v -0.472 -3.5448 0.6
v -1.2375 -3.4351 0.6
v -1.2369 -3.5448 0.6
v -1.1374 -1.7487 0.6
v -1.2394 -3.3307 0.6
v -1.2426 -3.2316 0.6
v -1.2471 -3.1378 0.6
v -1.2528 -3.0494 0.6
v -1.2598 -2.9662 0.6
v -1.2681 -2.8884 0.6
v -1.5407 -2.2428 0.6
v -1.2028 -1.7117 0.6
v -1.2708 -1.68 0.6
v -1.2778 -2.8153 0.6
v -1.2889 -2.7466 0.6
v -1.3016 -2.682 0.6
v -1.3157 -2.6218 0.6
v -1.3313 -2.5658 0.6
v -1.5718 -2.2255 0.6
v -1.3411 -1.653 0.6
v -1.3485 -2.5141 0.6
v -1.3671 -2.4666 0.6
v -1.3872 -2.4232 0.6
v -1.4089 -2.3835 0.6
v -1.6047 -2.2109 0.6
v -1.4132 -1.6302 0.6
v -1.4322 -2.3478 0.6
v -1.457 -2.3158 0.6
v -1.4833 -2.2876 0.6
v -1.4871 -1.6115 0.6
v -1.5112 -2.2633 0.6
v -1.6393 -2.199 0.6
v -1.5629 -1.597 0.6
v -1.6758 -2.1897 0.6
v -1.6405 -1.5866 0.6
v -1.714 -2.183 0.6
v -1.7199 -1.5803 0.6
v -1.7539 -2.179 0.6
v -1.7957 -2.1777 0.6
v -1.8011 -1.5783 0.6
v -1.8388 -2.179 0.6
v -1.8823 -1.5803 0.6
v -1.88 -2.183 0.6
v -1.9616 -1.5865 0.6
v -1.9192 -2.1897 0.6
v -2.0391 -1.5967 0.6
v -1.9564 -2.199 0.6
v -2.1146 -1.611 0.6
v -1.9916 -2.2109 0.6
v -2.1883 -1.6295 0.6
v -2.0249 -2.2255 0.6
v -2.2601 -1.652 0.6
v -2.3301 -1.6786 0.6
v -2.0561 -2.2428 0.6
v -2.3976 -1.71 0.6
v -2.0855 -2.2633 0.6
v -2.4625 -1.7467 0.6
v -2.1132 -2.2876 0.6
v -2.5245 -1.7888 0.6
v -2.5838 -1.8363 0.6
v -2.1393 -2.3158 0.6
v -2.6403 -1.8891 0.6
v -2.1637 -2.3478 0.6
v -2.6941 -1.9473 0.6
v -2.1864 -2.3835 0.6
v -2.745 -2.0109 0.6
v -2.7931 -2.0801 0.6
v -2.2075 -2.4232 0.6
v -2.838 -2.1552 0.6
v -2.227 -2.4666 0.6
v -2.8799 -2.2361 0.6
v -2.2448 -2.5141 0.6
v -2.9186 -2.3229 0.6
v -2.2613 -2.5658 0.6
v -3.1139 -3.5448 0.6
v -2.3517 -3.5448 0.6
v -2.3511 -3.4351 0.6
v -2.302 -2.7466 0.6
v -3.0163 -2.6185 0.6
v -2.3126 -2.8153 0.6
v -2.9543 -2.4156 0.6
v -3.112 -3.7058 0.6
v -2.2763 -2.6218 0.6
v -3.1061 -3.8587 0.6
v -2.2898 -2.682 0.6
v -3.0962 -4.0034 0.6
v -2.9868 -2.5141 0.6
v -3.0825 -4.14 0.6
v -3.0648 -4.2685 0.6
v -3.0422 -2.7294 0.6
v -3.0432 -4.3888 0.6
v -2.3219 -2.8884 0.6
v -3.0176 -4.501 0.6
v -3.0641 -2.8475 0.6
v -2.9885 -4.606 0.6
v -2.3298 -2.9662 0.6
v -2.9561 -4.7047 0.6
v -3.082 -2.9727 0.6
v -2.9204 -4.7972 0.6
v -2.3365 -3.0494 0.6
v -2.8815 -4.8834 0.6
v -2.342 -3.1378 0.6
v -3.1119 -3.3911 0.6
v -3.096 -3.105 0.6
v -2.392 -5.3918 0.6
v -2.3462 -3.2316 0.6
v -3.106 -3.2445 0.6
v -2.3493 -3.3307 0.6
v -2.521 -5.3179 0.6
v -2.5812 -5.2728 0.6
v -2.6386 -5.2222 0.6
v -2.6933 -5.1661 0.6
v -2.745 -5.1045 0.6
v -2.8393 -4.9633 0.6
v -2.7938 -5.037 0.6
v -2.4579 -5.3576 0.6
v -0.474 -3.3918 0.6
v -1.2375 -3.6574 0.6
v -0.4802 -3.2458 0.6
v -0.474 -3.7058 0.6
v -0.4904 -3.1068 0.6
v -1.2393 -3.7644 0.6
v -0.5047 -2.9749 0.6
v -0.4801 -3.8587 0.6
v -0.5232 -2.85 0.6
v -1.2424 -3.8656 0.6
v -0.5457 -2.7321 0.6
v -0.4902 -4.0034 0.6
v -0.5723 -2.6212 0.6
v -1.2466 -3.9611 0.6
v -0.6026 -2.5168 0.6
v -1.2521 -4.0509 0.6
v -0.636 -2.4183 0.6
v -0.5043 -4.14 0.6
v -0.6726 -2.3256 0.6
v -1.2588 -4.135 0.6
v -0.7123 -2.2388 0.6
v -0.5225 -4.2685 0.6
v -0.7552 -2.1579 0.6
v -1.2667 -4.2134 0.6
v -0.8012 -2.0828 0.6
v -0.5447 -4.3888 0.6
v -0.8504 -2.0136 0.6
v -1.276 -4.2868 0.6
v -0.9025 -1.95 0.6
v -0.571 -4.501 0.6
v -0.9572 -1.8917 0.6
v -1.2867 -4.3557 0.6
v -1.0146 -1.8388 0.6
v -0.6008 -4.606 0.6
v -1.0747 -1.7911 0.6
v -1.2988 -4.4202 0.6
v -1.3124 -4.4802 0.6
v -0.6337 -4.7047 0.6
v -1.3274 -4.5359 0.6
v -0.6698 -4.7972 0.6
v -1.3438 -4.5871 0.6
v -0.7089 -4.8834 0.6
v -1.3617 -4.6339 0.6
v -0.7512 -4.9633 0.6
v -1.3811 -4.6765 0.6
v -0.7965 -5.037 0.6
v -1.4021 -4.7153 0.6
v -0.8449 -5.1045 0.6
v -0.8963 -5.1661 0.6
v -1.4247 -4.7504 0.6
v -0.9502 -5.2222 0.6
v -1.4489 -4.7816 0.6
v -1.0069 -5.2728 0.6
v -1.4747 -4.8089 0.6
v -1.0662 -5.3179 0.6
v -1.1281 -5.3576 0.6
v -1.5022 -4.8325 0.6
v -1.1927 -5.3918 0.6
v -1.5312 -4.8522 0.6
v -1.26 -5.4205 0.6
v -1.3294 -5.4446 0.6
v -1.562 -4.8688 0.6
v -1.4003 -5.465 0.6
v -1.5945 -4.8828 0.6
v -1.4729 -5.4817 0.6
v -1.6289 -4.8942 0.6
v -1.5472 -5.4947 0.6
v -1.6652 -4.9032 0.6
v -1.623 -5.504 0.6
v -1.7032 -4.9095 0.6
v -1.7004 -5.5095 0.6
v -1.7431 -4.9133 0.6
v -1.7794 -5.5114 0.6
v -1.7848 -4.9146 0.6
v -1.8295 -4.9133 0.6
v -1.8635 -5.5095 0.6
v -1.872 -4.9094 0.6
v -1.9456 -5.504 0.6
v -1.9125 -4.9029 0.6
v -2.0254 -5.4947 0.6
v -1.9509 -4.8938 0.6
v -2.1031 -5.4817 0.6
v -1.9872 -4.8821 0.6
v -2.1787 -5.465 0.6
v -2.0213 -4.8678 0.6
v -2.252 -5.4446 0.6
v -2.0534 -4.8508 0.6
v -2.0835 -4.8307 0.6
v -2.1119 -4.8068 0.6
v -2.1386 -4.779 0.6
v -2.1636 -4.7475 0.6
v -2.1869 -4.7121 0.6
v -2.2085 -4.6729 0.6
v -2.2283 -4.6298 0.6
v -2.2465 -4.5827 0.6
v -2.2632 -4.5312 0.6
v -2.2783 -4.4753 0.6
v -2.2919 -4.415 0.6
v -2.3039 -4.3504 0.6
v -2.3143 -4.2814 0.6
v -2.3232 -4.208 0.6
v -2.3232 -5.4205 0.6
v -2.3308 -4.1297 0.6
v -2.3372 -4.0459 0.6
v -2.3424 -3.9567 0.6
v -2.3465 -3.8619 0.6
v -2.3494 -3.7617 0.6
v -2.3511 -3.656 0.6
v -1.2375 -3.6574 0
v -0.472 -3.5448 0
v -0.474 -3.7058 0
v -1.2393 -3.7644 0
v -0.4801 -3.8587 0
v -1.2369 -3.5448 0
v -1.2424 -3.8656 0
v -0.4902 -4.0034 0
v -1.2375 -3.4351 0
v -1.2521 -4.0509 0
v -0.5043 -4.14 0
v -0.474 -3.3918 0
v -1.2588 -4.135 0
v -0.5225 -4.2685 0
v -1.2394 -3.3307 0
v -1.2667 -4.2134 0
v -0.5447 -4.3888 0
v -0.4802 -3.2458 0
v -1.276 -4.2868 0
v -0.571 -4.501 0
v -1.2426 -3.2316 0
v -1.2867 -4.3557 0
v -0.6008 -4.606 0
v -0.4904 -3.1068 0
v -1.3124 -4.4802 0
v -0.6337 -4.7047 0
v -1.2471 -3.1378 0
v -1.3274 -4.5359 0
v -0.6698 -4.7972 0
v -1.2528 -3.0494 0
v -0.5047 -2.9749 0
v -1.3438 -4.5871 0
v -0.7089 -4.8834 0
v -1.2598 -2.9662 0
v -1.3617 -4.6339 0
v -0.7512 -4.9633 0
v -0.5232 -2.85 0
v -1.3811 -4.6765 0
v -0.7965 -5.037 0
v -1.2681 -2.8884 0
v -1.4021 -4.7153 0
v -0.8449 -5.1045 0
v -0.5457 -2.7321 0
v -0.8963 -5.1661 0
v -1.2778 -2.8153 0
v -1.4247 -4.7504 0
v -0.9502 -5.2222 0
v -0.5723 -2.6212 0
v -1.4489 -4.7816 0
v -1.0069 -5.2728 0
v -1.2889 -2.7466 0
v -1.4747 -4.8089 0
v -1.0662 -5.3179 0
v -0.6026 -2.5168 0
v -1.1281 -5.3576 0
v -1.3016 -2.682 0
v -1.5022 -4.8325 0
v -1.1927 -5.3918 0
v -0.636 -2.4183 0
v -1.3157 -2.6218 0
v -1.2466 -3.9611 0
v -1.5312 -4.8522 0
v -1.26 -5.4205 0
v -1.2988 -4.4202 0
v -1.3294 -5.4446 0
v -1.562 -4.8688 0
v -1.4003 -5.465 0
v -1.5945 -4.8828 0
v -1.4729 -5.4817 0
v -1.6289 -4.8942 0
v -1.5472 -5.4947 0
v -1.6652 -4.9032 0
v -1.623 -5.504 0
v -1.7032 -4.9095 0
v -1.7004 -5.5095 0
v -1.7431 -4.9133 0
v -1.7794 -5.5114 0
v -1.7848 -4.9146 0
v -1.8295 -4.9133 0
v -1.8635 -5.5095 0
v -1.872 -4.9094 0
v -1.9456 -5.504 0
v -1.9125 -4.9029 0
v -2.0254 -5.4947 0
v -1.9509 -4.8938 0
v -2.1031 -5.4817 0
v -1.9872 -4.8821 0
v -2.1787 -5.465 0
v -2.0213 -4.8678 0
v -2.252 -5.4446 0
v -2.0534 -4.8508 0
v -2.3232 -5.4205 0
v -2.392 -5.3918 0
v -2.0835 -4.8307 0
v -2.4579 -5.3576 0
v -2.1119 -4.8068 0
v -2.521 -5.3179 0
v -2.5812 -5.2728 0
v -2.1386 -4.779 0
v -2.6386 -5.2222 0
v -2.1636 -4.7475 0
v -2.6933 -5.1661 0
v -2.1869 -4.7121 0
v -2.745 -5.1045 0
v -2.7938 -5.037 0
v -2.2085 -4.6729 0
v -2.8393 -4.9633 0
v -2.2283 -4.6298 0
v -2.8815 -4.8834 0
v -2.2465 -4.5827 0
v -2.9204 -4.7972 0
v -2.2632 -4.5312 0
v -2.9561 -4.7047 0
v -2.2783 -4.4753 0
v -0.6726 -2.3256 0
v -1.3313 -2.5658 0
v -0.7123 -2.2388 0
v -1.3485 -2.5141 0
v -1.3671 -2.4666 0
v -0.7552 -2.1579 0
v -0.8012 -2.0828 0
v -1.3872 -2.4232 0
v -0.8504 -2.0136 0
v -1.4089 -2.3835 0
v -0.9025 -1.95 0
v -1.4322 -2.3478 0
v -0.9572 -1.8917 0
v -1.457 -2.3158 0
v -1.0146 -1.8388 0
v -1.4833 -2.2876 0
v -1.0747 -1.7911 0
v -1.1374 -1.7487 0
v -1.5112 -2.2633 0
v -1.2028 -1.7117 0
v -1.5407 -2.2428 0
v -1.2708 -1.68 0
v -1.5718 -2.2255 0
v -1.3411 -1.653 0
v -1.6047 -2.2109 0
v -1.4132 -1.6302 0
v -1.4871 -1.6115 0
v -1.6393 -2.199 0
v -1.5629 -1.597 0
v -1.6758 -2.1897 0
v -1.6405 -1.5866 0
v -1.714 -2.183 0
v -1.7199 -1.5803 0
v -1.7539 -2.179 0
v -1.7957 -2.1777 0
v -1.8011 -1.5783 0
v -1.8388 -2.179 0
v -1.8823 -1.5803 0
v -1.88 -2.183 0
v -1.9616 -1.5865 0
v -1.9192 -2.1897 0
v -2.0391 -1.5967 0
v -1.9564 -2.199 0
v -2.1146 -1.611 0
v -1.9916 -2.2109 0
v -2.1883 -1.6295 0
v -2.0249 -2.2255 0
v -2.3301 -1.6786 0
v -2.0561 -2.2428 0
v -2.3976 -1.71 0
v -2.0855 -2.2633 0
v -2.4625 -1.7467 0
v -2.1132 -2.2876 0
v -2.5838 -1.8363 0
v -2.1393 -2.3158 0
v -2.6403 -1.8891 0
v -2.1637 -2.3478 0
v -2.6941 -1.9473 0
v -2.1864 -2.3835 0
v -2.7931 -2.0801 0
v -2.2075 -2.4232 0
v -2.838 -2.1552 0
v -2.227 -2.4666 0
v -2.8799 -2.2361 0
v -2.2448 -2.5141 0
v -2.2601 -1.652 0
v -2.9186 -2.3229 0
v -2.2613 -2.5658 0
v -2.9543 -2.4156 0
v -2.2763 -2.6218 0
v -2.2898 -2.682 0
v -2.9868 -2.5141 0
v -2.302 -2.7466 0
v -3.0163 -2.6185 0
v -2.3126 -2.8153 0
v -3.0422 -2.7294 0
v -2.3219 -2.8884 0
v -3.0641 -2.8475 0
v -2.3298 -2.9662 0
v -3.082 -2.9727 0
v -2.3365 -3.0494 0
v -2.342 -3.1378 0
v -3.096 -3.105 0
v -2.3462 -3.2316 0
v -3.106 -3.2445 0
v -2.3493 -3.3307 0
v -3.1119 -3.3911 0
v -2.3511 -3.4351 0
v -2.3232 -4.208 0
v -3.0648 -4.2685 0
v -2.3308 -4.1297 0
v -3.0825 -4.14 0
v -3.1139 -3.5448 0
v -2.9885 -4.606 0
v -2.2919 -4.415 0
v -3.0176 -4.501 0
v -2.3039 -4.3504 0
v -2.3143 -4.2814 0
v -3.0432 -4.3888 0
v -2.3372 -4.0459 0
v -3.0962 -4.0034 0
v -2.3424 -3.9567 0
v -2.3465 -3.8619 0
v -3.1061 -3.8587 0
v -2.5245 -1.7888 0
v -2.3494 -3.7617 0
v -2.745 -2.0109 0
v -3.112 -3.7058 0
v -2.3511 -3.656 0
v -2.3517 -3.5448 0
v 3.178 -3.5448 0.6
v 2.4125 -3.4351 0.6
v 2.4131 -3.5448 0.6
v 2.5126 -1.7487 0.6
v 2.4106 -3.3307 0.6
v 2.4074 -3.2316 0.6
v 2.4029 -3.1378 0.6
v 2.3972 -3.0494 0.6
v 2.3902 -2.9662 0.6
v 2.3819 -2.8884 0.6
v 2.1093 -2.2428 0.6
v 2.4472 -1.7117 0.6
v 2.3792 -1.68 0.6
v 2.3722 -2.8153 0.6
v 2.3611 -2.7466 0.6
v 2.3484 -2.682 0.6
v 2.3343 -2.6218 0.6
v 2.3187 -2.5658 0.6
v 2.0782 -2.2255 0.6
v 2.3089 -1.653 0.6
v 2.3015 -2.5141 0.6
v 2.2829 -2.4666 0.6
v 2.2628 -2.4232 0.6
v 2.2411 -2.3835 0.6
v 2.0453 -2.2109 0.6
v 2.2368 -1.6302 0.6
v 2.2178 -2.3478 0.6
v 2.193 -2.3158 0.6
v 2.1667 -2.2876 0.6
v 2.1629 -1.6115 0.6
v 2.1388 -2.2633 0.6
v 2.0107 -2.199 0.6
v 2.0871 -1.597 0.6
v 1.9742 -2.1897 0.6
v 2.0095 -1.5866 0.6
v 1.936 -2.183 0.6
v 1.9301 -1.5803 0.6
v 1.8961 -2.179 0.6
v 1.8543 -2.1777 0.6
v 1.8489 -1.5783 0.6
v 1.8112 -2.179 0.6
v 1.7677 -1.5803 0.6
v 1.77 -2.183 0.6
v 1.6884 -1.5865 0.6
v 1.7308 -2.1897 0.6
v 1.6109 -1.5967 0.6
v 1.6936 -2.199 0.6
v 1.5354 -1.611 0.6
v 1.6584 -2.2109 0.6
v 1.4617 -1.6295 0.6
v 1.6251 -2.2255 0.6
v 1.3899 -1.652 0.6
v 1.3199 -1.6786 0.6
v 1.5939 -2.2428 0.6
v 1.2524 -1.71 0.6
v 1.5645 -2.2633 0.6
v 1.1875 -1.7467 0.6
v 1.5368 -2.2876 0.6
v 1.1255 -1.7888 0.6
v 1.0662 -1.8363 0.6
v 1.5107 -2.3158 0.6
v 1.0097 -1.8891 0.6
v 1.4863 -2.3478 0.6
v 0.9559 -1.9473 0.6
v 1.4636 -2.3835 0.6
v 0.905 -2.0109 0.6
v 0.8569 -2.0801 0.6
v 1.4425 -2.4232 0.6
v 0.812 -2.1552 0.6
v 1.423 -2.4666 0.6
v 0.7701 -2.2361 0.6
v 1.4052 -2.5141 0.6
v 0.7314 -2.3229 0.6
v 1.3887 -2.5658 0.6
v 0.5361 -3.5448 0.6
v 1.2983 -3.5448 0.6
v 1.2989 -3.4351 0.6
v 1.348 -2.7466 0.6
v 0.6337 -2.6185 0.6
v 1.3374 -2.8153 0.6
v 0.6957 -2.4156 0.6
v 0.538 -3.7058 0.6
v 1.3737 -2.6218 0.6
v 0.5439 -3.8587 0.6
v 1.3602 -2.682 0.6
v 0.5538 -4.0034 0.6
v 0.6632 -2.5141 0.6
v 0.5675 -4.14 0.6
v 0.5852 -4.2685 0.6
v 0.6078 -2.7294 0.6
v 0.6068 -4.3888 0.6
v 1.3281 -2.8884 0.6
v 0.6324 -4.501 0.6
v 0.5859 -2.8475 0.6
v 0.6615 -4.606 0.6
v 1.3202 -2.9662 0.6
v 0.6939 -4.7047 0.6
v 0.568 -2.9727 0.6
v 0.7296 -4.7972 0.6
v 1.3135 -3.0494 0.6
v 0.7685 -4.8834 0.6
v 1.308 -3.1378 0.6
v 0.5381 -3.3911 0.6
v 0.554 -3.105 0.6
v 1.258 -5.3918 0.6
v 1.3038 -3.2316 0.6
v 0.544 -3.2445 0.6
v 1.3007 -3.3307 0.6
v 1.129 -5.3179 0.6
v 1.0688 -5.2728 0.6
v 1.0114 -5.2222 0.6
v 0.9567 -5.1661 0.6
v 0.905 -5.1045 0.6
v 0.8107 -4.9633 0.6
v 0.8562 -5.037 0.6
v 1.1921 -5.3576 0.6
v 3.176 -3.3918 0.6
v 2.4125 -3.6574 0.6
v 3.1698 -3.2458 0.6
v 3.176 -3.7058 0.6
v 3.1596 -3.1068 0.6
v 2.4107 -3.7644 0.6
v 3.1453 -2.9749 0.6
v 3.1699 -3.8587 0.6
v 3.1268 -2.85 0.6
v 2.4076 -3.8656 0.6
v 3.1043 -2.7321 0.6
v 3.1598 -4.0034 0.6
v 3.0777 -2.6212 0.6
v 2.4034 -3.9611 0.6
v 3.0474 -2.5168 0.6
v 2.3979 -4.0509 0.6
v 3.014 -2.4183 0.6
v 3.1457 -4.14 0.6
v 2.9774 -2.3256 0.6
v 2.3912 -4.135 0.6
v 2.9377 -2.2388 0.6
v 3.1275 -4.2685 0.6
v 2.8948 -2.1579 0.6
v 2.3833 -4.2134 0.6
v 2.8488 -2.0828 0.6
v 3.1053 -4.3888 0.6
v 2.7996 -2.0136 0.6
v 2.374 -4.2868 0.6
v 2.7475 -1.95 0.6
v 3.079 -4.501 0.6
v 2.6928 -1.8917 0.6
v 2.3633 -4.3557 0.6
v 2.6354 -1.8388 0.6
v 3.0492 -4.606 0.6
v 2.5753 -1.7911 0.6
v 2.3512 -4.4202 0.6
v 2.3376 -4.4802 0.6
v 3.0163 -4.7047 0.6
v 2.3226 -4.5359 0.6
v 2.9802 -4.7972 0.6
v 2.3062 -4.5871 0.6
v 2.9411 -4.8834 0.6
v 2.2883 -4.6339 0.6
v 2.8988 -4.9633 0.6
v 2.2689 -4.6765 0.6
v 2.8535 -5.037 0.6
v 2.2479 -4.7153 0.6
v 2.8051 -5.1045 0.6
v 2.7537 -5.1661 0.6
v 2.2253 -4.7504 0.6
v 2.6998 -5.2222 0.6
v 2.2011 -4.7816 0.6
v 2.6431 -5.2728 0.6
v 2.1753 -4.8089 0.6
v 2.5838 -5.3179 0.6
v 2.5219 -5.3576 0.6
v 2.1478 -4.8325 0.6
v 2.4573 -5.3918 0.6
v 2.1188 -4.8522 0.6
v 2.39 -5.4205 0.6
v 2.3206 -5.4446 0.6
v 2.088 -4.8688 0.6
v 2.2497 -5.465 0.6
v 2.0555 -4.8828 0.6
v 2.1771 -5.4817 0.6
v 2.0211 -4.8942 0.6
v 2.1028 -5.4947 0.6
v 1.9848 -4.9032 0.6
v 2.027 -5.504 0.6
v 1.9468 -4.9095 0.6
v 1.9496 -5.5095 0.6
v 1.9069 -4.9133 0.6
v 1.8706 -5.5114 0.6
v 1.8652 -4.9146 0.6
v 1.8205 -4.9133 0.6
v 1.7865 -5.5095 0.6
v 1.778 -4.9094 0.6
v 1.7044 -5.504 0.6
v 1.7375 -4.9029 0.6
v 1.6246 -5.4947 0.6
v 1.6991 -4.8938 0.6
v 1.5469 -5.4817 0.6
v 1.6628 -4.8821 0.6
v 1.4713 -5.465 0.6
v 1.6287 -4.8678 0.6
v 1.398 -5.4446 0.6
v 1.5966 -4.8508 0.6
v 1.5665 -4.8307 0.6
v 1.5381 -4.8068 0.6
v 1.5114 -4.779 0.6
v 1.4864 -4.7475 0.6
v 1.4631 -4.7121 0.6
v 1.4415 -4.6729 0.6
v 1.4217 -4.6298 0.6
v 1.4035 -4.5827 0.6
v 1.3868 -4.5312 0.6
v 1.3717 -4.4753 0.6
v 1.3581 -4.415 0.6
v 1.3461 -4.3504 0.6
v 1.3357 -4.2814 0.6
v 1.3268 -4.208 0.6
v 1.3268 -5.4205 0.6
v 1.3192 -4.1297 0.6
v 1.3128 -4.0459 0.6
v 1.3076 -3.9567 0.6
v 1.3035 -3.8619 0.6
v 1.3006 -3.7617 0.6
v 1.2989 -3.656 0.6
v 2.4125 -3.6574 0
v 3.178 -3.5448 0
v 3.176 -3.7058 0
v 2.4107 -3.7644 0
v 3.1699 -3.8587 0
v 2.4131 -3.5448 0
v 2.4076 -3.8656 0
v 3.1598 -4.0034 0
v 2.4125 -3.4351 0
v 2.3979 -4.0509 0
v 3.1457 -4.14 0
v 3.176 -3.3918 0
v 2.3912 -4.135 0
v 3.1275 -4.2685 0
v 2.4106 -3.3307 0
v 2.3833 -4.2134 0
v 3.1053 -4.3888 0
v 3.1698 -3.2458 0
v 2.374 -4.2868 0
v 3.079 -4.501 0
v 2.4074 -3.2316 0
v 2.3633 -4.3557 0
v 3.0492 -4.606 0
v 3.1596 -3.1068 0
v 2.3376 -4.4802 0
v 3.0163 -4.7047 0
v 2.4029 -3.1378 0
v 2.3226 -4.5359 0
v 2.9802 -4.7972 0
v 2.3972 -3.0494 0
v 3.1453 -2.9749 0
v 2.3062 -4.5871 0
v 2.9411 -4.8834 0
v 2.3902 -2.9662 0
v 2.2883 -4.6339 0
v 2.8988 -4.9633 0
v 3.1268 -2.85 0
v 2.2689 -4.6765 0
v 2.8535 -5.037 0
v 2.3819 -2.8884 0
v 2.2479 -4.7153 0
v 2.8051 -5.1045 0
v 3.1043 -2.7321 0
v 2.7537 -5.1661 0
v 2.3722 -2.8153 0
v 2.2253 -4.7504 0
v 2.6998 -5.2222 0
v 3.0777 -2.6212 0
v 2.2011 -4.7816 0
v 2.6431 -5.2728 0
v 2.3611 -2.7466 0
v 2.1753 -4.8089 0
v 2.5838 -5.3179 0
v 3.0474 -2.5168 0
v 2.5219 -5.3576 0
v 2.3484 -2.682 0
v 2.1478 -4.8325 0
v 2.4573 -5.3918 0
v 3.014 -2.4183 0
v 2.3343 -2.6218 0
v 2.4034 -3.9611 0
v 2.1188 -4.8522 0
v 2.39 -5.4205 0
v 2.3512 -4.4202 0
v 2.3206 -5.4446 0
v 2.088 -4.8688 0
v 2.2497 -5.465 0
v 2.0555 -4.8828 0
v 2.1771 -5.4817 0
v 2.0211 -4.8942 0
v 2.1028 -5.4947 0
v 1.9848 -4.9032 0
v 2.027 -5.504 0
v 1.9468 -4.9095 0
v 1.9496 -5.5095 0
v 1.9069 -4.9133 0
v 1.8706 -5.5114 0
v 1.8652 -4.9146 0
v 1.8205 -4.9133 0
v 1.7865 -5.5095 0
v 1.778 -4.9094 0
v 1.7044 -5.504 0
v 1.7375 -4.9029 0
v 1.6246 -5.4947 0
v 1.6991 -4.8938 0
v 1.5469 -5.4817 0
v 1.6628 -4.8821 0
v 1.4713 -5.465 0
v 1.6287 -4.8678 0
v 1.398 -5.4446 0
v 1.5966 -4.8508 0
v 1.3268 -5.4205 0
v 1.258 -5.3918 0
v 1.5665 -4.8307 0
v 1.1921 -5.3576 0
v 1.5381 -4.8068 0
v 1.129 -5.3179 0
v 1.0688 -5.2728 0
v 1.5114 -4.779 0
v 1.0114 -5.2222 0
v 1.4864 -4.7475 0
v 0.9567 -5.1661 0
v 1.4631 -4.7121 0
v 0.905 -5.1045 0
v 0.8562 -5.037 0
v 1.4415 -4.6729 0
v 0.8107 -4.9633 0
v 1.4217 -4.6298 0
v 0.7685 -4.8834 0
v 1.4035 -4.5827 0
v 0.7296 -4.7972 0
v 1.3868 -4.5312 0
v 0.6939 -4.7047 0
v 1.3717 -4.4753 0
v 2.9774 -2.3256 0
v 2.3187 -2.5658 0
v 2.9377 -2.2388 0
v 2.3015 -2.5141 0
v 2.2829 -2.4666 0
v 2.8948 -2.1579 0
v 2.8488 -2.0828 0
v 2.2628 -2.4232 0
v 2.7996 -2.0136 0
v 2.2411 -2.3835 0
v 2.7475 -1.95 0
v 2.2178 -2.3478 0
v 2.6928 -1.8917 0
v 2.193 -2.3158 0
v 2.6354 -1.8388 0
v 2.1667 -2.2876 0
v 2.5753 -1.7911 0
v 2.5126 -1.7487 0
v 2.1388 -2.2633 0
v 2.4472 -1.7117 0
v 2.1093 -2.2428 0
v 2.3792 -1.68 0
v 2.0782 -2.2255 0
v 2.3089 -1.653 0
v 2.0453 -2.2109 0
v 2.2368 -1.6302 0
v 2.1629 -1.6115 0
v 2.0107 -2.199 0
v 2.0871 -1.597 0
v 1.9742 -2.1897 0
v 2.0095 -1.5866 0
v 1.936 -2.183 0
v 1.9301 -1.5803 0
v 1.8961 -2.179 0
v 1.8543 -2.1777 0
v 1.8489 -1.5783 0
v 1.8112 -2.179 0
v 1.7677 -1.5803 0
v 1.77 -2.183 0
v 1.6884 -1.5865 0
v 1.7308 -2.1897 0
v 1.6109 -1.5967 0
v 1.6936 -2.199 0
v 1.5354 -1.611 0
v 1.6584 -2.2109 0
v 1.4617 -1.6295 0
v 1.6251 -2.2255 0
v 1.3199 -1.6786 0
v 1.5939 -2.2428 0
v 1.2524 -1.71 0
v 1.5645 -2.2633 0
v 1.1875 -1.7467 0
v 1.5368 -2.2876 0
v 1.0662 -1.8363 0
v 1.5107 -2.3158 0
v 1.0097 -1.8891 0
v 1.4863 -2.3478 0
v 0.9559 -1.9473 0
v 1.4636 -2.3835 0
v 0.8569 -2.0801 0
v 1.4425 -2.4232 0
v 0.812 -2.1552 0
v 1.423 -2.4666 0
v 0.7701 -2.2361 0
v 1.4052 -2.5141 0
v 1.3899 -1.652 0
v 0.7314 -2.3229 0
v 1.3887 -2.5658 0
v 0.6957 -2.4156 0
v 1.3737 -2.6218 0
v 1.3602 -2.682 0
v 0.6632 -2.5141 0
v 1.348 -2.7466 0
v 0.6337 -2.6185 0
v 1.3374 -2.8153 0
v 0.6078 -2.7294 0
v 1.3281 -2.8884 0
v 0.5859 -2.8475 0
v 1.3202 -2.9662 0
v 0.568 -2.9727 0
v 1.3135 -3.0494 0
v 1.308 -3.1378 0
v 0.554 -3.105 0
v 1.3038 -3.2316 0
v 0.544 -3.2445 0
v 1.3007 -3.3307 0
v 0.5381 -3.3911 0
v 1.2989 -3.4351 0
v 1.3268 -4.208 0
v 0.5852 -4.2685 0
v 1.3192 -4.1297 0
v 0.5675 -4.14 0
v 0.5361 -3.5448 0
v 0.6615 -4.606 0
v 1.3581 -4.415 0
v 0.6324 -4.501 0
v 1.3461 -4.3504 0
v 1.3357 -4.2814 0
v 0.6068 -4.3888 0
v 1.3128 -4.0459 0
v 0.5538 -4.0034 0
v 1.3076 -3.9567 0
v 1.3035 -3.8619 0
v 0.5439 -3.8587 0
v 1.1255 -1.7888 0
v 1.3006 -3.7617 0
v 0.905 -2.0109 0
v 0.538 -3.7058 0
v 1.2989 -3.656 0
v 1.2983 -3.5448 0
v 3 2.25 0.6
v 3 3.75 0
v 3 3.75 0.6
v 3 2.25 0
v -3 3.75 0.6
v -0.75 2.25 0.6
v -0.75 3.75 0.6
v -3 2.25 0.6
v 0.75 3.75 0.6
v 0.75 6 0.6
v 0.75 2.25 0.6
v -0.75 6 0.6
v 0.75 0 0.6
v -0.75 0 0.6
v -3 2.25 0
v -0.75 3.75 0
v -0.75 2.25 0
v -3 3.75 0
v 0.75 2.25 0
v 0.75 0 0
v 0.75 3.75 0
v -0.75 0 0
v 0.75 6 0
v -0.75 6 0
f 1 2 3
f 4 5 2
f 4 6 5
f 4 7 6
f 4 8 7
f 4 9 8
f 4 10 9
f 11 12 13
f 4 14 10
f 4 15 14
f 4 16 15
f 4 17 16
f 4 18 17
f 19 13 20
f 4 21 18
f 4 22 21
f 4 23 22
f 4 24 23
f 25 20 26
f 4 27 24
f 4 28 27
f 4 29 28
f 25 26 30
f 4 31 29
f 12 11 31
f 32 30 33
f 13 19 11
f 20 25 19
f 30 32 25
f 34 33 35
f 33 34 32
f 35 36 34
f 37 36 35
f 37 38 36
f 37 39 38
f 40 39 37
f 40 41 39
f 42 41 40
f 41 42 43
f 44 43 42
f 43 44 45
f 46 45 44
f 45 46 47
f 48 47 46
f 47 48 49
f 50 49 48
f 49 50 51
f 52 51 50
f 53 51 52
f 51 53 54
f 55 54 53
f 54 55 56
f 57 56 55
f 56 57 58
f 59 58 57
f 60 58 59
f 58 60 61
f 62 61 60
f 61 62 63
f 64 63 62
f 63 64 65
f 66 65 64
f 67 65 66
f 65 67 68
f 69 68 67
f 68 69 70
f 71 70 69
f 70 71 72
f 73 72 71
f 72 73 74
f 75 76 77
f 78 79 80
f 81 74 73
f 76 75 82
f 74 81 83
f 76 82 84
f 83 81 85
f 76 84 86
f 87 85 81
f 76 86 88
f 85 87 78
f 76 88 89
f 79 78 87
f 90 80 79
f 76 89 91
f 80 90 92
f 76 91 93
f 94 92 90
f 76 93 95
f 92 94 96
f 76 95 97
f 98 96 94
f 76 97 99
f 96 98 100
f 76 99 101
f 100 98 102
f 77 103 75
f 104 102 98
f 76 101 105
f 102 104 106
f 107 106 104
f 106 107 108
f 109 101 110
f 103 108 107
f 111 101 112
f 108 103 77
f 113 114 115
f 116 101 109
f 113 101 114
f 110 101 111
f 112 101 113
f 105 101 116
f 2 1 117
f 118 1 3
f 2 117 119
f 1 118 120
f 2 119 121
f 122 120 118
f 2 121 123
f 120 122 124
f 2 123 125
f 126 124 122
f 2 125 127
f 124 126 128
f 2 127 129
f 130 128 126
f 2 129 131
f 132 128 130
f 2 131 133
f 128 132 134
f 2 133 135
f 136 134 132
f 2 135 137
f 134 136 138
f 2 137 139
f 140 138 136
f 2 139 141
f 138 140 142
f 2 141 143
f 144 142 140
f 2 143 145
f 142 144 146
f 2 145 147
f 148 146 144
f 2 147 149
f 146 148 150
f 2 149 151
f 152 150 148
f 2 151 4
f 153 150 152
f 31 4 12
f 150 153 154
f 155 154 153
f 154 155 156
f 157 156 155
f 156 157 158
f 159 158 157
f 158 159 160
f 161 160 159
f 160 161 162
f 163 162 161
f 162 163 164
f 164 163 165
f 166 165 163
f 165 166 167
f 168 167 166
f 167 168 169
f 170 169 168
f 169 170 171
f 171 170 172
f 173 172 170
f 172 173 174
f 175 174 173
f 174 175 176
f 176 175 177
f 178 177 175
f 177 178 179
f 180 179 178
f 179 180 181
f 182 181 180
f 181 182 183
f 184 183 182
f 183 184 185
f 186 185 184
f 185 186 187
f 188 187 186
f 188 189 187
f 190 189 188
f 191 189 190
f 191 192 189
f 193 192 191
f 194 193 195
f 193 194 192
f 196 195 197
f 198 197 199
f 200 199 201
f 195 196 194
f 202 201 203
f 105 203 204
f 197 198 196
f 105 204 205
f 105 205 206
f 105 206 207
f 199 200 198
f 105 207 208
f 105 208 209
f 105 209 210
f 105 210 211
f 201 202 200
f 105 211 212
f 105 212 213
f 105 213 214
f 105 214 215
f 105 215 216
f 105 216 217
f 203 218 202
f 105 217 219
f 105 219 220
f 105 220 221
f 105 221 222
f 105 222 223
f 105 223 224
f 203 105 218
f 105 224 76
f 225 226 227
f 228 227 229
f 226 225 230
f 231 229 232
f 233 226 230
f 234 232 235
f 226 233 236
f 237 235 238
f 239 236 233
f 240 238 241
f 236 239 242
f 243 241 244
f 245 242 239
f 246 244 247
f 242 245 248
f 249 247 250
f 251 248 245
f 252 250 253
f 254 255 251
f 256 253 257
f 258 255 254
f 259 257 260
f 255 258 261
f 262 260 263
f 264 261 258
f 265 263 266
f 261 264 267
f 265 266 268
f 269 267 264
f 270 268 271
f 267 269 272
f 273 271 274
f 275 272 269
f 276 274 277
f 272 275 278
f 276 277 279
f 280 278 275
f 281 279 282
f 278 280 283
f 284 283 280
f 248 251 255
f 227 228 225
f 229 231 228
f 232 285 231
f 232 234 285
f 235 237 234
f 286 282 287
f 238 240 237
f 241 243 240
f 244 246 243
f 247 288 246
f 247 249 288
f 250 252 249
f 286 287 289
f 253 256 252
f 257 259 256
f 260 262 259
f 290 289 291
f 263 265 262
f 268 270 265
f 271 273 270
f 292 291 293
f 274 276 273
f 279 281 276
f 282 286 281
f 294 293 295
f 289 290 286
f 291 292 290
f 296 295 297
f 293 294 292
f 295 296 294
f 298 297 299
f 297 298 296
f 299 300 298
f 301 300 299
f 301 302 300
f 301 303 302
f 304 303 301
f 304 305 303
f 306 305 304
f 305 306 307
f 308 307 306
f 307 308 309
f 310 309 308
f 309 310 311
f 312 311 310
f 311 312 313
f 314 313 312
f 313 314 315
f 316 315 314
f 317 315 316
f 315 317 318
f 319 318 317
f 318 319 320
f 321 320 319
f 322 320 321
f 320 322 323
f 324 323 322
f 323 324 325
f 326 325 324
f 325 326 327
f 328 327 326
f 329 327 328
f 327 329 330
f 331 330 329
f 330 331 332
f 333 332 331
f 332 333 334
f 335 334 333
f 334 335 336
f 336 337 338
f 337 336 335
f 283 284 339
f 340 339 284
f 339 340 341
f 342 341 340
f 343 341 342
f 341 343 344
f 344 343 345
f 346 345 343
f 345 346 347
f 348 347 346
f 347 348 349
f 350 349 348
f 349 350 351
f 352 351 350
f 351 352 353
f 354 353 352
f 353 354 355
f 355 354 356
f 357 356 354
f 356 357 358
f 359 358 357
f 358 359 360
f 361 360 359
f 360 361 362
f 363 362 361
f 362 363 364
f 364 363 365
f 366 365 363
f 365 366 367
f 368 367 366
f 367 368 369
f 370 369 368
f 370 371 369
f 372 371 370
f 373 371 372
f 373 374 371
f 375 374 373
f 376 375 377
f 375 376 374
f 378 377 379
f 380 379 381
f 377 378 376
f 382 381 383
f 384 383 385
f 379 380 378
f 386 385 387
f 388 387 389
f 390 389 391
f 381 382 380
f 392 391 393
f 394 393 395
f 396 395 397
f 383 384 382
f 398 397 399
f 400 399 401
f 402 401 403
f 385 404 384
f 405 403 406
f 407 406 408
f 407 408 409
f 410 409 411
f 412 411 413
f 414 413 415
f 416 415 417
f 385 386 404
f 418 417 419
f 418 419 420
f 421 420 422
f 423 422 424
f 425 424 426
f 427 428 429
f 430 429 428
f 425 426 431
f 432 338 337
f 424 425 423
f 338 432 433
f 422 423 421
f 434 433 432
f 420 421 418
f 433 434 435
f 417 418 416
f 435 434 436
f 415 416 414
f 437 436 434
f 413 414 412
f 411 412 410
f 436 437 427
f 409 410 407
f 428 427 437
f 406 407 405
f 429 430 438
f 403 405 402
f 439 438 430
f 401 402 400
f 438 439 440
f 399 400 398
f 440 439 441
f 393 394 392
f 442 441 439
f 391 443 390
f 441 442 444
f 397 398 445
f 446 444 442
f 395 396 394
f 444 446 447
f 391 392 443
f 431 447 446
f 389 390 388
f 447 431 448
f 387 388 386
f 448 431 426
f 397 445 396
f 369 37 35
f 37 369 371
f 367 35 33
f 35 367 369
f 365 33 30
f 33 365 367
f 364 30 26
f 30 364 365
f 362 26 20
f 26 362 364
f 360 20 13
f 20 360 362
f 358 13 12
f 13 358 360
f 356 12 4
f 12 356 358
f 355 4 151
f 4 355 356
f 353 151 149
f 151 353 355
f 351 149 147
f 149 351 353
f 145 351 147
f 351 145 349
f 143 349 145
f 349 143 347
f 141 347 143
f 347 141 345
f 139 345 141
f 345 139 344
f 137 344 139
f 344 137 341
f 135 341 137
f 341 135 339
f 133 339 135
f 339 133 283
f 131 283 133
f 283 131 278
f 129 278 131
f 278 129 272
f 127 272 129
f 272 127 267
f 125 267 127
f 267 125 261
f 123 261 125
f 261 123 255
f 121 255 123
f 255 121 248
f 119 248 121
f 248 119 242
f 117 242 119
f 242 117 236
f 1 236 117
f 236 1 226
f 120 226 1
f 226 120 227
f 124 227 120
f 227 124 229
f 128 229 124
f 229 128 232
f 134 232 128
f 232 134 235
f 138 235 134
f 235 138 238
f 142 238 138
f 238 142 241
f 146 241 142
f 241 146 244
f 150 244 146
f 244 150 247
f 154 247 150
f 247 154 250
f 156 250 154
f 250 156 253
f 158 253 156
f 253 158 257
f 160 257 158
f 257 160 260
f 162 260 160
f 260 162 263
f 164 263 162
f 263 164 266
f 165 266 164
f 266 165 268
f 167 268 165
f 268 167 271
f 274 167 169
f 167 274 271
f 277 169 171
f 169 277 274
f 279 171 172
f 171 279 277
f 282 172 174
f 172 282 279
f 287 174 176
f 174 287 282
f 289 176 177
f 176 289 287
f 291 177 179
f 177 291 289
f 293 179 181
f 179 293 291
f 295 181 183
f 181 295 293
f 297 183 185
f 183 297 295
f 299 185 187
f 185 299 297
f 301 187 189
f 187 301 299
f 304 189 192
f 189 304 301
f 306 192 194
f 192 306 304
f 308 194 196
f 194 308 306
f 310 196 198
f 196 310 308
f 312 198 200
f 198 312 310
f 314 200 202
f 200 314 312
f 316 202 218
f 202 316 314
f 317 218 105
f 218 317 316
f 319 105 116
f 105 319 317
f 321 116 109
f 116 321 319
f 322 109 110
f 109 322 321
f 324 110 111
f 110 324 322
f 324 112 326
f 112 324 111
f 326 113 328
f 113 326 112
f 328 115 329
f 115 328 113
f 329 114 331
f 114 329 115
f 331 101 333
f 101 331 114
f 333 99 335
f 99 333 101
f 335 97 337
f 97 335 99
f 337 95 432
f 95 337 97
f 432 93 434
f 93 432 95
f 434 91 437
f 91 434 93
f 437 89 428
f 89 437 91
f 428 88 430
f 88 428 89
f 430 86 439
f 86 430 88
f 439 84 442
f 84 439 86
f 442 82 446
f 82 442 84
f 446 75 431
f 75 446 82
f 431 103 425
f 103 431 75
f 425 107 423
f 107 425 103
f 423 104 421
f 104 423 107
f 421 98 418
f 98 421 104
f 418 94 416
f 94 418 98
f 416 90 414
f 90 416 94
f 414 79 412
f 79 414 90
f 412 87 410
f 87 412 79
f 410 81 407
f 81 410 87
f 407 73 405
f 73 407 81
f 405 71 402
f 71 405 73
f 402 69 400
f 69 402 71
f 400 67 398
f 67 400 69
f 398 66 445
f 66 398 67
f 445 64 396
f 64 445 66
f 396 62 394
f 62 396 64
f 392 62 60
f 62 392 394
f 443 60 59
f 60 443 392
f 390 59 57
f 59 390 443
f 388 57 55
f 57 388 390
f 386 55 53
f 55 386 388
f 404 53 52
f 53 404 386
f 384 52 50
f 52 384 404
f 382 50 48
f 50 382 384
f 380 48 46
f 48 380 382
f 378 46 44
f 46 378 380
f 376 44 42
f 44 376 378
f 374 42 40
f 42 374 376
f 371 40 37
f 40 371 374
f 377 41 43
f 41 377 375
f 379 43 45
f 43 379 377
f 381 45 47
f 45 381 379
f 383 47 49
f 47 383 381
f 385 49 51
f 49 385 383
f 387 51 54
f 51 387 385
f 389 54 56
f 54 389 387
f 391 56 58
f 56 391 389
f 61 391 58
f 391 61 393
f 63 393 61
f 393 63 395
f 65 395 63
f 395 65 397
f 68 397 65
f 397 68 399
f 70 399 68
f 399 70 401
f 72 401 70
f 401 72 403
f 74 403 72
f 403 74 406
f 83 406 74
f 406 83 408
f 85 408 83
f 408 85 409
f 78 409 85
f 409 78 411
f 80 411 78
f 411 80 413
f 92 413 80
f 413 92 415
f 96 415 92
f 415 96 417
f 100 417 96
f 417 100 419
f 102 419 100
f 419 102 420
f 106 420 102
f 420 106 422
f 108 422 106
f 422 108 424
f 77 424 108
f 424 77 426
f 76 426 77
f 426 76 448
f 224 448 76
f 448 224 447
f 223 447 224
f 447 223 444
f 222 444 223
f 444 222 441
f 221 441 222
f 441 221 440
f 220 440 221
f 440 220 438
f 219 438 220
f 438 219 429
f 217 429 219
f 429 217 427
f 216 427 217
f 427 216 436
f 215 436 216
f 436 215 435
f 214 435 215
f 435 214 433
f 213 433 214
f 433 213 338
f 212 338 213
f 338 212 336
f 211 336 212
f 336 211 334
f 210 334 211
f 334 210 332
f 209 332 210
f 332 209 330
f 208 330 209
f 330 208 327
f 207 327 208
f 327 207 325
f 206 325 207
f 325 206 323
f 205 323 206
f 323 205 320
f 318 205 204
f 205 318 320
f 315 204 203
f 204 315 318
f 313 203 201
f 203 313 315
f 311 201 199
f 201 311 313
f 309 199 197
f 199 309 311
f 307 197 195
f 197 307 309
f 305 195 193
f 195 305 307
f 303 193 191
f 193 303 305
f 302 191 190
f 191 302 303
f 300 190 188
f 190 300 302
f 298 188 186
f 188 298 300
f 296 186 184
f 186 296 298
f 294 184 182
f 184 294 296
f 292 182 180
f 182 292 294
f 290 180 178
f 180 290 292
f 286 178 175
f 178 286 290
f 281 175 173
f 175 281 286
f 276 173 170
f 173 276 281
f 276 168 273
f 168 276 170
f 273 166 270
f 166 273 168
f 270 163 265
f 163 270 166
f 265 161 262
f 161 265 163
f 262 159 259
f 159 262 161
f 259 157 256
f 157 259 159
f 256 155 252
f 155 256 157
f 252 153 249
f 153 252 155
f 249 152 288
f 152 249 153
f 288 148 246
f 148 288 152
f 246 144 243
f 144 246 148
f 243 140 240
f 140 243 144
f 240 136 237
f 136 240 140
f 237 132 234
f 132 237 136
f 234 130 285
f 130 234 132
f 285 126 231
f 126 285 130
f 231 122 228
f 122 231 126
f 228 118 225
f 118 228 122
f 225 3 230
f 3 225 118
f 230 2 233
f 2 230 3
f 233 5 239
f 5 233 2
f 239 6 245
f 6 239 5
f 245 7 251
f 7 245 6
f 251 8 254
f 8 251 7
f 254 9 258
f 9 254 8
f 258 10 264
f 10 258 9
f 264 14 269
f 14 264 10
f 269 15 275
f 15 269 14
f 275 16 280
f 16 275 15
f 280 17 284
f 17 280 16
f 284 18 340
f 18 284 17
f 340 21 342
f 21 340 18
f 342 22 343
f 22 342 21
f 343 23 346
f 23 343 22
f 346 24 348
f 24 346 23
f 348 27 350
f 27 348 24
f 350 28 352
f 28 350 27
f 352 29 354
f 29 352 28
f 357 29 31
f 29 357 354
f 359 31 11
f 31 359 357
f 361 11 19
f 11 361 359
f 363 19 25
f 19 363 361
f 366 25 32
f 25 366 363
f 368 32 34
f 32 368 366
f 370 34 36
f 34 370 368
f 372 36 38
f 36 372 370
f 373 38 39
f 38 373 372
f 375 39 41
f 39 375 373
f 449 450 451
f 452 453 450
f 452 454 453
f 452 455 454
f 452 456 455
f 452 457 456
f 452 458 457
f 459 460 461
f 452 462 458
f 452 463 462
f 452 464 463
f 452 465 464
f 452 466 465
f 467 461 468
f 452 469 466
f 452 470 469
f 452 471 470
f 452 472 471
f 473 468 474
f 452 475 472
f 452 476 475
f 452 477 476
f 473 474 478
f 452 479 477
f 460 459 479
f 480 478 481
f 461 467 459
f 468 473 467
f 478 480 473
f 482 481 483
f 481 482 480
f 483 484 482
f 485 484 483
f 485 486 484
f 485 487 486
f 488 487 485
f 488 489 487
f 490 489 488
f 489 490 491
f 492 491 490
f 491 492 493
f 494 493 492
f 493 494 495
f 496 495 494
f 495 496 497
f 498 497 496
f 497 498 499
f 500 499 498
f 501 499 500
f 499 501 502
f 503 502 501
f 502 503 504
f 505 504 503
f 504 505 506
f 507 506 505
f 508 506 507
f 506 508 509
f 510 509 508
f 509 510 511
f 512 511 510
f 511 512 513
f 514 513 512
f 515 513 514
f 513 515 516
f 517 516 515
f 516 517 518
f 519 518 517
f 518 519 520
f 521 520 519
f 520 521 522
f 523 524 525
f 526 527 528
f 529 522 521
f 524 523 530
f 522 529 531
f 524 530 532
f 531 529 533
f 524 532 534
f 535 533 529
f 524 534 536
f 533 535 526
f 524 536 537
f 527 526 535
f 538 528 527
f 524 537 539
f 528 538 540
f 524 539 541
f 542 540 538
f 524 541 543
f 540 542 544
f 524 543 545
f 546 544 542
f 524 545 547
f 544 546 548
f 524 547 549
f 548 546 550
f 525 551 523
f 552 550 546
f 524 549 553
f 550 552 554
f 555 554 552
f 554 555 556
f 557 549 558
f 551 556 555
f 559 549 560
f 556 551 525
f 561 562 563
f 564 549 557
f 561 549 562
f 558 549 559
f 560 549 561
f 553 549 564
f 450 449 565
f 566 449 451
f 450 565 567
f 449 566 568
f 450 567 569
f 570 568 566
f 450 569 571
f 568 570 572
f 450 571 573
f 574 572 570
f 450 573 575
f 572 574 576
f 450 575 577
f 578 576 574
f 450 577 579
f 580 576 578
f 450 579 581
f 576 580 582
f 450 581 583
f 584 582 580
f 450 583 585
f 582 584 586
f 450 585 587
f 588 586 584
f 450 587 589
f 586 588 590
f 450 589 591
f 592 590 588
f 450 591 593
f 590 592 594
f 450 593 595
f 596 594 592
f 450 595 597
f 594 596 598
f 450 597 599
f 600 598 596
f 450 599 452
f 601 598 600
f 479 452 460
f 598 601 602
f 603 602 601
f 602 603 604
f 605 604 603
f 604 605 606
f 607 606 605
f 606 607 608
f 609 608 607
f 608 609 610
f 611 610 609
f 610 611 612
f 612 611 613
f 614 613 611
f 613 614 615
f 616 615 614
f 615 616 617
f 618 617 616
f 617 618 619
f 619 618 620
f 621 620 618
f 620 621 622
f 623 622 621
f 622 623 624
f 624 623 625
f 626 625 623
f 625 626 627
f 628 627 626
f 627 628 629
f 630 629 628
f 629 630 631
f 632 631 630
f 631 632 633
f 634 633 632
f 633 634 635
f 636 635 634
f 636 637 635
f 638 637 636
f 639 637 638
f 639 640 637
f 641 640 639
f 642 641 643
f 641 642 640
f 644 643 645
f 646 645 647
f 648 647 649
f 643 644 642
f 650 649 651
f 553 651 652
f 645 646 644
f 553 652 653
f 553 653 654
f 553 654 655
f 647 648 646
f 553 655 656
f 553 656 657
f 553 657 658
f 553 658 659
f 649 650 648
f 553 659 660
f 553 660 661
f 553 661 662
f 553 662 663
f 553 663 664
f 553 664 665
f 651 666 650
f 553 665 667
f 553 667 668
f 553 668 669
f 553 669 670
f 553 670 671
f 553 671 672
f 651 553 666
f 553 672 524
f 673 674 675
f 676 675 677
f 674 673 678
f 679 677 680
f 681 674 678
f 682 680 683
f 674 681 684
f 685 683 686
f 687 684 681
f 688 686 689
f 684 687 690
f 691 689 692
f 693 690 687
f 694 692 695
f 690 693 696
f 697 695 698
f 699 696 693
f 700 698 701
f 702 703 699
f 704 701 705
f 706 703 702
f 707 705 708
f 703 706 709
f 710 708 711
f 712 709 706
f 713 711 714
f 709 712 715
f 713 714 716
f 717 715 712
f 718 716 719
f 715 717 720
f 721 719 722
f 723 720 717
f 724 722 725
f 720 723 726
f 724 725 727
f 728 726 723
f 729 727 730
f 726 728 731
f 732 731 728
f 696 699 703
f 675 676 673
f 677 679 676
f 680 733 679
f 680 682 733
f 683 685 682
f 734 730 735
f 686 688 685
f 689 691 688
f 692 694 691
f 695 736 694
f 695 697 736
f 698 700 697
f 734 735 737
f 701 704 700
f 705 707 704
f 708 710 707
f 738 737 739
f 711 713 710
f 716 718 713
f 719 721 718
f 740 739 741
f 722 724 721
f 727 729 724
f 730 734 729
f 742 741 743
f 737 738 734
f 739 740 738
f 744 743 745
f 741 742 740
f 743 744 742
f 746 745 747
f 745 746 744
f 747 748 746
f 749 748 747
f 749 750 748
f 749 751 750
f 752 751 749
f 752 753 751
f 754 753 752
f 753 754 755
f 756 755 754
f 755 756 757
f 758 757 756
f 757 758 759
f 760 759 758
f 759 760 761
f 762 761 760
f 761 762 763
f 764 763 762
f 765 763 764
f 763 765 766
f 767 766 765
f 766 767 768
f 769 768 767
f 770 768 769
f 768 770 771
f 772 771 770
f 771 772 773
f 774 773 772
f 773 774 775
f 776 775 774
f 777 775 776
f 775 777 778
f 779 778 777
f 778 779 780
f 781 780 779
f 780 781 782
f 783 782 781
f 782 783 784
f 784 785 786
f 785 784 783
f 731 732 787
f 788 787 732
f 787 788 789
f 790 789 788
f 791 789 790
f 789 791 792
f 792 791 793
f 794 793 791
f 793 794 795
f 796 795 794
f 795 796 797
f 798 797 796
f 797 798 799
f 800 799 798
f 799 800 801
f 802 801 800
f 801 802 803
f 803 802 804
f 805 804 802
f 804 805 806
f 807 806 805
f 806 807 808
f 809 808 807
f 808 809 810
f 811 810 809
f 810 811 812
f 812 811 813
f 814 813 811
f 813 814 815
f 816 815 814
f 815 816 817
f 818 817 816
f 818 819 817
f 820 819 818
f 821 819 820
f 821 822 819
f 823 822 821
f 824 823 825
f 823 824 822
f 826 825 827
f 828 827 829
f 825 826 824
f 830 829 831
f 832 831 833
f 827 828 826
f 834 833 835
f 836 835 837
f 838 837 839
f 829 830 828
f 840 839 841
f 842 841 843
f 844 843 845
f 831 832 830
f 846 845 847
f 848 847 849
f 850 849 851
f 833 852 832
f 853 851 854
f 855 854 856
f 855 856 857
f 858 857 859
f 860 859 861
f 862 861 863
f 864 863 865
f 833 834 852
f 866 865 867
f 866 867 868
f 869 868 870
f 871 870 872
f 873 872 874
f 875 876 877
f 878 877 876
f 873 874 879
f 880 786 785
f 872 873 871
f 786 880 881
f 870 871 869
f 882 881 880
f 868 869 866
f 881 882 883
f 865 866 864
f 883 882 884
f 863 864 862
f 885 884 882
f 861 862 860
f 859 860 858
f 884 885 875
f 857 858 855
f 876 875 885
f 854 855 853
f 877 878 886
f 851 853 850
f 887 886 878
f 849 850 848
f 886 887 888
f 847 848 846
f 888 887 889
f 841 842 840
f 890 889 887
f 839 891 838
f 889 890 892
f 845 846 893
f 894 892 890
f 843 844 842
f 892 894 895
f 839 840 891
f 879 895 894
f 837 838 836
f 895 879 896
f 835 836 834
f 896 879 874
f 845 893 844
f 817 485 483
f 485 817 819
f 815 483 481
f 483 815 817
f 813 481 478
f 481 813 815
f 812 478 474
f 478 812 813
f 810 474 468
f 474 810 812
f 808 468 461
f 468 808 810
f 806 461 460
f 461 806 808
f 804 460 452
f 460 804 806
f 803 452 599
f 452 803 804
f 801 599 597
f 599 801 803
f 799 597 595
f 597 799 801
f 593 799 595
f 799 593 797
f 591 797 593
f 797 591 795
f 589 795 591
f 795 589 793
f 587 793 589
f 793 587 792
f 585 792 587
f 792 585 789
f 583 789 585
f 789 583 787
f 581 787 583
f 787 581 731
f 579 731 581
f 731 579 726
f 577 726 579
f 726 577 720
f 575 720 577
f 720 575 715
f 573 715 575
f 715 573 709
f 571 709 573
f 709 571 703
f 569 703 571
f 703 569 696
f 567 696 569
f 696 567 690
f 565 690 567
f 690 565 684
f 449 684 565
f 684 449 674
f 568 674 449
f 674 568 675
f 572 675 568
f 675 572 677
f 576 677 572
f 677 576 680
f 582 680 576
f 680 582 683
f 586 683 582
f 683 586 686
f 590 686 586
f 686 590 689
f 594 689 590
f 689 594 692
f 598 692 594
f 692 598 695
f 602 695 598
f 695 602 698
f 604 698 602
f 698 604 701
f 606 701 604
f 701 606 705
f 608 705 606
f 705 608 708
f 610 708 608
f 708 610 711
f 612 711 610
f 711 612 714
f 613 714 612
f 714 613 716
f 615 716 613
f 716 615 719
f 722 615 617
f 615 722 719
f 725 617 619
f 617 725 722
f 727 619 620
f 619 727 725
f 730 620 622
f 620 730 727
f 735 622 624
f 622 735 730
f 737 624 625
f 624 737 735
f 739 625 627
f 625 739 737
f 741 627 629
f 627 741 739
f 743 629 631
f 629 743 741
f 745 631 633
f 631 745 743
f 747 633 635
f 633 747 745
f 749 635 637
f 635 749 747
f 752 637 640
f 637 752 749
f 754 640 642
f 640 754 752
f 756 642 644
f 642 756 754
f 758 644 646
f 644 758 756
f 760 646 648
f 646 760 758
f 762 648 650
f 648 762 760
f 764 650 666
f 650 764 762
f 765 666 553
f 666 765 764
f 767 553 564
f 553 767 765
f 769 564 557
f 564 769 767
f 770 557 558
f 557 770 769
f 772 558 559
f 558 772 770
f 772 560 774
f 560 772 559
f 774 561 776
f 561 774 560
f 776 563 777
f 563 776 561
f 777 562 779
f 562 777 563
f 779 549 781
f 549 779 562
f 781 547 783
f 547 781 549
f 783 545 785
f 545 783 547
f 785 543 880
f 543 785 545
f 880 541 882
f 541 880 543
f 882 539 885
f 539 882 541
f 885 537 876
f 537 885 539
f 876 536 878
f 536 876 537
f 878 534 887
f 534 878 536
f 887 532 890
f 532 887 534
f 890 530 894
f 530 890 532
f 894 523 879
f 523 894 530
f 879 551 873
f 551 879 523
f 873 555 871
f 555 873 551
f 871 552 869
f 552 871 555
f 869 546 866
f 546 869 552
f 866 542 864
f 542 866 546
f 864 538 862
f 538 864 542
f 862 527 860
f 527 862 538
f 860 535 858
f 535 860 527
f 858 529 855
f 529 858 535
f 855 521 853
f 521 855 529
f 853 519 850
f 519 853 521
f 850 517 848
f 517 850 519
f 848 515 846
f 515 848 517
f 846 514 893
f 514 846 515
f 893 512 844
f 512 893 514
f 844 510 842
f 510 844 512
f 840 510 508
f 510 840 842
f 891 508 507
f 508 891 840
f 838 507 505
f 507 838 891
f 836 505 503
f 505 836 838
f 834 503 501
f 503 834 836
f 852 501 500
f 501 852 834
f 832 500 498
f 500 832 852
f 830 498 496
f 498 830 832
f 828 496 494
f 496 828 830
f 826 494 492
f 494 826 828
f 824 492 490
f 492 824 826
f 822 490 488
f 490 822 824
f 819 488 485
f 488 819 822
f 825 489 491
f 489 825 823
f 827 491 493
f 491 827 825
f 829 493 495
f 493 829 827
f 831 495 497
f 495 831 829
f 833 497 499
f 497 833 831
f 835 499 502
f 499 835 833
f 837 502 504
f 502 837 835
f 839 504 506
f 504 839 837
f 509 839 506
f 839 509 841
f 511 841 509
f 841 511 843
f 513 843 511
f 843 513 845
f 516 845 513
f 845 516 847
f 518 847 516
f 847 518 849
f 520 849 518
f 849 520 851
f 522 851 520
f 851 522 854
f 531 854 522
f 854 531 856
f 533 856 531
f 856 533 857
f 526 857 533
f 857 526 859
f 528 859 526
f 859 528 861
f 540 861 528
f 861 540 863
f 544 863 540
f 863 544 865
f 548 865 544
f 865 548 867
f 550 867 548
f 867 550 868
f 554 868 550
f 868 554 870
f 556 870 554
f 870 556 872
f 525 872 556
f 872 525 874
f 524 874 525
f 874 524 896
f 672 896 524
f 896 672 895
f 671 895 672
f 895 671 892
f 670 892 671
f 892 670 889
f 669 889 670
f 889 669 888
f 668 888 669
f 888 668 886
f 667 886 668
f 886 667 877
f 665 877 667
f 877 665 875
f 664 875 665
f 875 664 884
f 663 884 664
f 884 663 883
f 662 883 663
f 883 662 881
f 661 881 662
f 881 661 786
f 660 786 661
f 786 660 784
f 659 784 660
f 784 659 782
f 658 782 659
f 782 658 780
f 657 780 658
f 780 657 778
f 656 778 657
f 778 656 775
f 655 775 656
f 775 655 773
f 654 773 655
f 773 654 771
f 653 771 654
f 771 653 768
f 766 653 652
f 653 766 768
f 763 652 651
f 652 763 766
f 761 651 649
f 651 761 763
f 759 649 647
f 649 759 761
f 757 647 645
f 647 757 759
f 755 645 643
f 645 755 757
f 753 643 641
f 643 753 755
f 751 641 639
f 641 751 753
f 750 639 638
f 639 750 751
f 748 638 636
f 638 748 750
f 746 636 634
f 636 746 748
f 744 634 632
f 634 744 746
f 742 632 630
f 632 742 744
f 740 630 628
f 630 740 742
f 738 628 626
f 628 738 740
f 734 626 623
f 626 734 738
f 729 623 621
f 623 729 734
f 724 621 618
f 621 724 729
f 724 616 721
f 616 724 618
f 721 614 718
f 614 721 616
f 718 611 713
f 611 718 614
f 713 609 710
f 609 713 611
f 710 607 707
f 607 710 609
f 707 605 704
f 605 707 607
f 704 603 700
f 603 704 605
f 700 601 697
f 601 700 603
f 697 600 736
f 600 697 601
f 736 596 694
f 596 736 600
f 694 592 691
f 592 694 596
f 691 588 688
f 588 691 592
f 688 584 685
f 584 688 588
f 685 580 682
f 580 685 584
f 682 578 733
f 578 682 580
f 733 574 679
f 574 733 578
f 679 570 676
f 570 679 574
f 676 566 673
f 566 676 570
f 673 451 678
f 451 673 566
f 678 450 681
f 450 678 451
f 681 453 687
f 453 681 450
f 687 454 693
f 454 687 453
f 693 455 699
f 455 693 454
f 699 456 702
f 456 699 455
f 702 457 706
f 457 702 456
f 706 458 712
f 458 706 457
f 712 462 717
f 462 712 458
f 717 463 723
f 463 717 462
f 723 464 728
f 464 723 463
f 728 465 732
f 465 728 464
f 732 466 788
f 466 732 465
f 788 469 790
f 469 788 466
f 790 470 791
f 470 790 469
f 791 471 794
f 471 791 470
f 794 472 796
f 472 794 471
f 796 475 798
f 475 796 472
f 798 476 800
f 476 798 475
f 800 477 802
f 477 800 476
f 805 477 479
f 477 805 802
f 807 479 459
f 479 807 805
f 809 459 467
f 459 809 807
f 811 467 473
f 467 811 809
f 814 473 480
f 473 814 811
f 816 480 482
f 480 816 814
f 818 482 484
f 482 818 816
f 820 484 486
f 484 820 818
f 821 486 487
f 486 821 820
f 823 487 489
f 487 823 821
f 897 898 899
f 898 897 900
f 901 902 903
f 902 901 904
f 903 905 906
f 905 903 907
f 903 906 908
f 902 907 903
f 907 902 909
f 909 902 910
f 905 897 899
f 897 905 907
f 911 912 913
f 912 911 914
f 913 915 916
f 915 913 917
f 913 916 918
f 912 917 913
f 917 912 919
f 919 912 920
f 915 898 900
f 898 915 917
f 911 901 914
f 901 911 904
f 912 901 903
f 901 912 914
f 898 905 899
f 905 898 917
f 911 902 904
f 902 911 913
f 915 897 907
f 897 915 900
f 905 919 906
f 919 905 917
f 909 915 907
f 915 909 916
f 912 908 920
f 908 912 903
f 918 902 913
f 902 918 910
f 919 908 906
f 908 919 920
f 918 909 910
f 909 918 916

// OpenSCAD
$fn = 50;

difference() {
	union() {
		translate(v = [-1.825, -3.5, 0.6]) {
			rotate(a = [180, 0, 0]) {
				linear_extrude(height = 0.6) {
					text(font = "Liberation Sans:style=Bold", halign = "center", size = 4.0, text = "0", valign = "center");
				}
			}
		}
		translate(v = [1.825, -3.5, 0.6]) {
			rotate(a = [180, 0, 0]) {
				linear_extrude(height = 0.6) {
					text(font = "Liberation Sans:style=Bold", halign = "center", size = 4.0, text = "0", valign = "center");
				}
			}
		}
		translate(v = [-3.0, 2.25, 0]) {
			cube(size = [6, 1.5, 0.6]);
		}
		translate(v = [-0.75, 0.0, 0]) {
			cube(size = [1.5, 6, 0.6]);
		}
	}
	union();
}
